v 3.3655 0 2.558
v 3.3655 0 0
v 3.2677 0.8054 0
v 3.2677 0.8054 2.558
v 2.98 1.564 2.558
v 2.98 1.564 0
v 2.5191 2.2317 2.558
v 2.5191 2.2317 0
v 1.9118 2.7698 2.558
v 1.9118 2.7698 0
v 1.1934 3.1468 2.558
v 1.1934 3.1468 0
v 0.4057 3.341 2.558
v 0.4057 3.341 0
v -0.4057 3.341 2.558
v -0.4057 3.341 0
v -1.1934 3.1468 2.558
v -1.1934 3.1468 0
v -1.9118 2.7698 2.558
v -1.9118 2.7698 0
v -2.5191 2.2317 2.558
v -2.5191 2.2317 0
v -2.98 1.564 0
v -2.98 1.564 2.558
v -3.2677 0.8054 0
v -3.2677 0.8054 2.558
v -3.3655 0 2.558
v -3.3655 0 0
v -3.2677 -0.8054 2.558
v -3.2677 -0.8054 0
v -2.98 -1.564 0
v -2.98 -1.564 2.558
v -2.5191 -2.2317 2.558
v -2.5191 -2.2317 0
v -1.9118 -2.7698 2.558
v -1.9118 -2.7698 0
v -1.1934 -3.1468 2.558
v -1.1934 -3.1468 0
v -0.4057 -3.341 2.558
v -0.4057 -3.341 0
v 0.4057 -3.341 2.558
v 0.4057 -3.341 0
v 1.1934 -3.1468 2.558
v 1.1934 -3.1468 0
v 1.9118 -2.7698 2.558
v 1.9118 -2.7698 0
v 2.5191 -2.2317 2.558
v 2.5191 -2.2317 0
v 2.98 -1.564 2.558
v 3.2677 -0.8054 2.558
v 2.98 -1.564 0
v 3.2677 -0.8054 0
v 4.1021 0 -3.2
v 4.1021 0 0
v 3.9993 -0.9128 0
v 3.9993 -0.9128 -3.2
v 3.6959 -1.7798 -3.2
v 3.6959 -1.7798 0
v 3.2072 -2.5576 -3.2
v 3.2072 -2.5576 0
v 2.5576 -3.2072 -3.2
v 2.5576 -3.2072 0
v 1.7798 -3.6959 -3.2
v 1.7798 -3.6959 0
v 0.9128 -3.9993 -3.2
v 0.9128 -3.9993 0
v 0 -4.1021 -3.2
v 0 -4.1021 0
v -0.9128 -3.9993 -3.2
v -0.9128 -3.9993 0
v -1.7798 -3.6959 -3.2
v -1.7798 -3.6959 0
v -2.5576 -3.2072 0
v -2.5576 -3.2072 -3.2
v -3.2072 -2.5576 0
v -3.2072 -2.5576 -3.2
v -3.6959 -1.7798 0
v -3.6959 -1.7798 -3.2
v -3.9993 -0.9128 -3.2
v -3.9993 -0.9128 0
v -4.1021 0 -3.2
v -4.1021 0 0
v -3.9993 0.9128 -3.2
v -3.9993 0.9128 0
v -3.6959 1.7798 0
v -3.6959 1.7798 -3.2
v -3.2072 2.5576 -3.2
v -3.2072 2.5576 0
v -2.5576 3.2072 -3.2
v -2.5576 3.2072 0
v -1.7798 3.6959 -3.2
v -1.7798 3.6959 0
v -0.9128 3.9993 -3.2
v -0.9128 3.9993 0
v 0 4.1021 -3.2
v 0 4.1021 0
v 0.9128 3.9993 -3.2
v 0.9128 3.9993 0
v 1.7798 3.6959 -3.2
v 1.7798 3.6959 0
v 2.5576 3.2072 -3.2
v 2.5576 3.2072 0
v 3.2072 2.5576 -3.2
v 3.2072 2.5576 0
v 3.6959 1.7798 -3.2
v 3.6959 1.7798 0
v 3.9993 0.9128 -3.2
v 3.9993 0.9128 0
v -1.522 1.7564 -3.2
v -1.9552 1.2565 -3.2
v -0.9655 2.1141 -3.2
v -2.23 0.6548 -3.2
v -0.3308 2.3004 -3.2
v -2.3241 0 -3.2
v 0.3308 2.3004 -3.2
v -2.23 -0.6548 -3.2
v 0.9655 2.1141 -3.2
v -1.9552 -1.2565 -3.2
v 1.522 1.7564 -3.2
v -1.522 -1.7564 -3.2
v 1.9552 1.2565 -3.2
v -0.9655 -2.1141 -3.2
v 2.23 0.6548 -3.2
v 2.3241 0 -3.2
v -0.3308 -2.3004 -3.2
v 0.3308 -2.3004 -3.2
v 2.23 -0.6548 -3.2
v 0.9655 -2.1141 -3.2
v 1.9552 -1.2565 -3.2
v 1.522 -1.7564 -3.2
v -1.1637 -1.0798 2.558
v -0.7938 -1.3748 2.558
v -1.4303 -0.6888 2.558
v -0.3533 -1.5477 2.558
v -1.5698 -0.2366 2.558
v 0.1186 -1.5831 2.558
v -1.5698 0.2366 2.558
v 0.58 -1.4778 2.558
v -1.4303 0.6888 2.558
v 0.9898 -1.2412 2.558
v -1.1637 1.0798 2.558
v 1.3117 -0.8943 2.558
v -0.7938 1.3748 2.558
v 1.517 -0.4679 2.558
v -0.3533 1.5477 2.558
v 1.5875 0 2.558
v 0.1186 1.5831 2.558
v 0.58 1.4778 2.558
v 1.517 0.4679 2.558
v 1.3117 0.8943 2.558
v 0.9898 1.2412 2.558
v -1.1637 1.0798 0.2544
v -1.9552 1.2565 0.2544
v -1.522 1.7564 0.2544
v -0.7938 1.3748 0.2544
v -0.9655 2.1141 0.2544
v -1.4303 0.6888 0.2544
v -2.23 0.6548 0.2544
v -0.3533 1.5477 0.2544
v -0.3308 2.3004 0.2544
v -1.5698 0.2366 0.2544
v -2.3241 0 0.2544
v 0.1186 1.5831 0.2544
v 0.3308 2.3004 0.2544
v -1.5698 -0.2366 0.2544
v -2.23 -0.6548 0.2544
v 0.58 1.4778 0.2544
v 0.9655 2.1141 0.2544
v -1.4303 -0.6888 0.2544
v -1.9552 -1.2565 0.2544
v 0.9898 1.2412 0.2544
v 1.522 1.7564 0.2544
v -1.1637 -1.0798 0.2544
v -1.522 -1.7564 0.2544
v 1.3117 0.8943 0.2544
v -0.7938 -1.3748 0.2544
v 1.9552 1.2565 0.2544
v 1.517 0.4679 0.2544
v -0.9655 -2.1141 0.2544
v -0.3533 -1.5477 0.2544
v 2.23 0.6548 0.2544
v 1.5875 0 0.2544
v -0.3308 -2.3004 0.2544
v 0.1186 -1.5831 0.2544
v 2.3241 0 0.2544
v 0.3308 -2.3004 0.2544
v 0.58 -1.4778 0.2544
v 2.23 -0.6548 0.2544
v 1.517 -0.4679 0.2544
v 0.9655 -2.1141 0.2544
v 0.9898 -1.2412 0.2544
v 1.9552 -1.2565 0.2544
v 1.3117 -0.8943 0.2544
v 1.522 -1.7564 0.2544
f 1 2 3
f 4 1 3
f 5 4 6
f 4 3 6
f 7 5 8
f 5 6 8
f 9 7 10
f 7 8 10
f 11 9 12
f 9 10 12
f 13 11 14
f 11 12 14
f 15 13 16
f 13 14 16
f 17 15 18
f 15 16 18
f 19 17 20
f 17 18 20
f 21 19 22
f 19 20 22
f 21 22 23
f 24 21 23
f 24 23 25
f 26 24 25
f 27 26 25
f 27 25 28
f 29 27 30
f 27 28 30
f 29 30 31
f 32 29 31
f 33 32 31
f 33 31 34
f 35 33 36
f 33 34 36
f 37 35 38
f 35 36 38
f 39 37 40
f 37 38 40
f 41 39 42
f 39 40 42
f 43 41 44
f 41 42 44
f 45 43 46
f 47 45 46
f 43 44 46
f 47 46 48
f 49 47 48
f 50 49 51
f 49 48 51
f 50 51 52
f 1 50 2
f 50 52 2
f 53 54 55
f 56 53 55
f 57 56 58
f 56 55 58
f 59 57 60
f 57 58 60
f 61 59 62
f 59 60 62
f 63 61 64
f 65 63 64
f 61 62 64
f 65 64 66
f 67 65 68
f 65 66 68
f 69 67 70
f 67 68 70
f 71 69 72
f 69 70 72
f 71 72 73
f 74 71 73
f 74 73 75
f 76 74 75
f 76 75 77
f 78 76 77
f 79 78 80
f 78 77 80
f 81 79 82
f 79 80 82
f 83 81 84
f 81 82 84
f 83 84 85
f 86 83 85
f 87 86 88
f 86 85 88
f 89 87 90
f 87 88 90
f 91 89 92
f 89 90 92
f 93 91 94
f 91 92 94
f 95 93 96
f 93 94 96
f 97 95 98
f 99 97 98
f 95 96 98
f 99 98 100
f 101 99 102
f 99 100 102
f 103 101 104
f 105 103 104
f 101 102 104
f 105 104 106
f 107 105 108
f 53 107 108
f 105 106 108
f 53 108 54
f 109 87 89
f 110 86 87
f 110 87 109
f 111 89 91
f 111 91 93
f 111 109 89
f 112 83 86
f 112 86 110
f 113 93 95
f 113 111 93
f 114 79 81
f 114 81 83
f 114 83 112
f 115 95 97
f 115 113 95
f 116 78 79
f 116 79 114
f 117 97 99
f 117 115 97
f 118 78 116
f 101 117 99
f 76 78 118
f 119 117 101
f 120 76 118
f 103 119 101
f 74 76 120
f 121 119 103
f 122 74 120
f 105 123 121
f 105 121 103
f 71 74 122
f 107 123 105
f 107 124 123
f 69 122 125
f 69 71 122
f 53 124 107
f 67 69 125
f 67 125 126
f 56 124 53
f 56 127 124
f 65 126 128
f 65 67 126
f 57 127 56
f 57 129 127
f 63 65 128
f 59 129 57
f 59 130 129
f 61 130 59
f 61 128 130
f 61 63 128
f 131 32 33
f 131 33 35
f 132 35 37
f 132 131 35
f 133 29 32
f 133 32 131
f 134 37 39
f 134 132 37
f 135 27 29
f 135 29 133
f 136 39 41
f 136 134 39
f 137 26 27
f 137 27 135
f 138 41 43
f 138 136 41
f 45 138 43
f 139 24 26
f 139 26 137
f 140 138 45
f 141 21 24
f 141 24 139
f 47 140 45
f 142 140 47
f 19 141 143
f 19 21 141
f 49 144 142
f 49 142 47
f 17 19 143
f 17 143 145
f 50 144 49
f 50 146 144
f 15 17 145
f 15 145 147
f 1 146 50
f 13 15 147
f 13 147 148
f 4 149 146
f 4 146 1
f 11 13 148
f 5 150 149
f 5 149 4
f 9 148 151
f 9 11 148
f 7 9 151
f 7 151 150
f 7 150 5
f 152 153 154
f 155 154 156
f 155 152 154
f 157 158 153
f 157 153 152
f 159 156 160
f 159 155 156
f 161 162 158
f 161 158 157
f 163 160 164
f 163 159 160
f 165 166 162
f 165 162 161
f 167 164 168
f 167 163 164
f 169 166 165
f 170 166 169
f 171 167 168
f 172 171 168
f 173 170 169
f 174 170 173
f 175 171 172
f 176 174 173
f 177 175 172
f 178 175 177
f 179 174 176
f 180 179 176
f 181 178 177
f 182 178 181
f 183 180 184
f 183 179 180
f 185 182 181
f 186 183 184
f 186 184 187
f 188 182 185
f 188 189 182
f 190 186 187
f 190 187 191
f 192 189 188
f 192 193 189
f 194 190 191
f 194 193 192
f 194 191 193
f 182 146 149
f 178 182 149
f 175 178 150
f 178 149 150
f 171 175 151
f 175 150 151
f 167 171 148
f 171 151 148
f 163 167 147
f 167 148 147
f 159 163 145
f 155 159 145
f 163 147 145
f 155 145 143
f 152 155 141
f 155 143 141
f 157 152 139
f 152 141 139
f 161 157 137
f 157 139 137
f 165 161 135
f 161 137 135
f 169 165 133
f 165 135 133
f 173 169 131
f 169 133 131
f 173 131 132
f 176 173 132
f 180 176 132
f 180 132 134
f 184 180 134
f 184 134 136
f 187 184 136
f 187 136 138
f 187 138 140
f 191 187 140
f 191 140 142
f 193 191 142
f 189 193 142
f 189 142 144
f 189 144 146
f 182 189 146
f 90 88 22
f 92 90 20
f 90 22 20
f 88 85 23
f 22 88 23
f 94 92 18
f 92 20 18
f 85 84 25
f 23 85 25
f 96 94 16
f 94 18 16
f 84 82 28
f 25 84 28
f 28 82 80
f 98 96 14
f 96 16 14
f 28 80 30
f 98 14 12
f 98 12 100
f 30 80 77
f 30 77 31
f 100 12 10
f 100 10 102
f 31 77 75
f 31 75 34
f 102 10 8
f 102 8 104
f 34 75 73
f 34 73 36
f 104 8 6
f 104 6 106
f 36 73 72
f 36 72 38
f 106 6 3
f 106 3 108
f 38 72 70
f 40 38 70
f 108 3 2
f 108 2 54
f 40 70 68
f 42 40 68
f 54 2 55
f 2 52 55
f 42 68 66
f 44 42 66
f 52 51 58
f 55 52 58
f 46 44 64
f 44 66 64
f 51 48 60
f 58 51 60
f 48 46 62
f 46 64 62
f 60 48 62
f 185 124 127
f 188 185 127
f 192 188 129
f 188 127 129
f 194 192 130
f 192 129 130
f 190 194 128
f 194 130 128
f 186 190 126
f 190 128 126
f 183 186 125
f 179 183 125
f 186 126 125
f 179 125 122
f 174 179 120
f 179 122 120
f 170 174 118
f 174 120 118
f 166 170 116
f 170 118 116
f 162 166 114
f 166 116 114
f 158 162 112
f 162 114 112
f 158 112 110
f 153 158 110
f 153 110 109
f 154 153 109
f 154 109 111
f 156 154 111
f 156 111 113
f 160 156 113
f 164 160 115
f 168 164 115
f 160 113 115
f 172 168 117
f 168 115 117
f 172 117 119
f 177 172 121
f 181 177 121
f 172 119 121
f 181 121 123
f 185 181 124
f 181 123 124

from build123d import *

# Parameters (mm, degrees)
F0_R     = 3.3655
F1_DEPTH = 2.558009
F2_R     = 4.1021
F3_DEPTH = 3.2
F4_R     = 2.3241
F5_DEPTH = 3.4544
F6_R     = 1.5875
F7_DEPTH = 7.62


with BuildPart() as f1:
    # F0 (on Top) → F1 (new body)
    with BuildSketch(Plane.XY):
        Circle(F0_R)
    extrude(amount=F1_DEPTH)

    # F2 (on face) → F3 (join)
    with BuildSketch(Plane(origin=(0, 0, 0), x_dir=(1, 0, 0), z_dir=(0, 0, -1))):
        Circle(F2_R)
    extrude(amount=F3_DEPTH)

    # F4 (on face) → F5 (cut)
    with BuildSketch(Plane(origin=(0, 0, -3.2), x_dir=(1, 0, 0), z_dir=(0, 0, -1))):
        Circle(F4_R)
    extrude(amount=-F5_DEPTH, mode=Mode.SUBTRACT)

    # F6 (on face) → F7 (cut)
    with BuildSketch(Plane.XY.offset(2.558009)):
        Circle(F6_R)
    extrude(amount=-F7_DEPTH, mode=Mode.SUBTRACT)


solid = f1.part
